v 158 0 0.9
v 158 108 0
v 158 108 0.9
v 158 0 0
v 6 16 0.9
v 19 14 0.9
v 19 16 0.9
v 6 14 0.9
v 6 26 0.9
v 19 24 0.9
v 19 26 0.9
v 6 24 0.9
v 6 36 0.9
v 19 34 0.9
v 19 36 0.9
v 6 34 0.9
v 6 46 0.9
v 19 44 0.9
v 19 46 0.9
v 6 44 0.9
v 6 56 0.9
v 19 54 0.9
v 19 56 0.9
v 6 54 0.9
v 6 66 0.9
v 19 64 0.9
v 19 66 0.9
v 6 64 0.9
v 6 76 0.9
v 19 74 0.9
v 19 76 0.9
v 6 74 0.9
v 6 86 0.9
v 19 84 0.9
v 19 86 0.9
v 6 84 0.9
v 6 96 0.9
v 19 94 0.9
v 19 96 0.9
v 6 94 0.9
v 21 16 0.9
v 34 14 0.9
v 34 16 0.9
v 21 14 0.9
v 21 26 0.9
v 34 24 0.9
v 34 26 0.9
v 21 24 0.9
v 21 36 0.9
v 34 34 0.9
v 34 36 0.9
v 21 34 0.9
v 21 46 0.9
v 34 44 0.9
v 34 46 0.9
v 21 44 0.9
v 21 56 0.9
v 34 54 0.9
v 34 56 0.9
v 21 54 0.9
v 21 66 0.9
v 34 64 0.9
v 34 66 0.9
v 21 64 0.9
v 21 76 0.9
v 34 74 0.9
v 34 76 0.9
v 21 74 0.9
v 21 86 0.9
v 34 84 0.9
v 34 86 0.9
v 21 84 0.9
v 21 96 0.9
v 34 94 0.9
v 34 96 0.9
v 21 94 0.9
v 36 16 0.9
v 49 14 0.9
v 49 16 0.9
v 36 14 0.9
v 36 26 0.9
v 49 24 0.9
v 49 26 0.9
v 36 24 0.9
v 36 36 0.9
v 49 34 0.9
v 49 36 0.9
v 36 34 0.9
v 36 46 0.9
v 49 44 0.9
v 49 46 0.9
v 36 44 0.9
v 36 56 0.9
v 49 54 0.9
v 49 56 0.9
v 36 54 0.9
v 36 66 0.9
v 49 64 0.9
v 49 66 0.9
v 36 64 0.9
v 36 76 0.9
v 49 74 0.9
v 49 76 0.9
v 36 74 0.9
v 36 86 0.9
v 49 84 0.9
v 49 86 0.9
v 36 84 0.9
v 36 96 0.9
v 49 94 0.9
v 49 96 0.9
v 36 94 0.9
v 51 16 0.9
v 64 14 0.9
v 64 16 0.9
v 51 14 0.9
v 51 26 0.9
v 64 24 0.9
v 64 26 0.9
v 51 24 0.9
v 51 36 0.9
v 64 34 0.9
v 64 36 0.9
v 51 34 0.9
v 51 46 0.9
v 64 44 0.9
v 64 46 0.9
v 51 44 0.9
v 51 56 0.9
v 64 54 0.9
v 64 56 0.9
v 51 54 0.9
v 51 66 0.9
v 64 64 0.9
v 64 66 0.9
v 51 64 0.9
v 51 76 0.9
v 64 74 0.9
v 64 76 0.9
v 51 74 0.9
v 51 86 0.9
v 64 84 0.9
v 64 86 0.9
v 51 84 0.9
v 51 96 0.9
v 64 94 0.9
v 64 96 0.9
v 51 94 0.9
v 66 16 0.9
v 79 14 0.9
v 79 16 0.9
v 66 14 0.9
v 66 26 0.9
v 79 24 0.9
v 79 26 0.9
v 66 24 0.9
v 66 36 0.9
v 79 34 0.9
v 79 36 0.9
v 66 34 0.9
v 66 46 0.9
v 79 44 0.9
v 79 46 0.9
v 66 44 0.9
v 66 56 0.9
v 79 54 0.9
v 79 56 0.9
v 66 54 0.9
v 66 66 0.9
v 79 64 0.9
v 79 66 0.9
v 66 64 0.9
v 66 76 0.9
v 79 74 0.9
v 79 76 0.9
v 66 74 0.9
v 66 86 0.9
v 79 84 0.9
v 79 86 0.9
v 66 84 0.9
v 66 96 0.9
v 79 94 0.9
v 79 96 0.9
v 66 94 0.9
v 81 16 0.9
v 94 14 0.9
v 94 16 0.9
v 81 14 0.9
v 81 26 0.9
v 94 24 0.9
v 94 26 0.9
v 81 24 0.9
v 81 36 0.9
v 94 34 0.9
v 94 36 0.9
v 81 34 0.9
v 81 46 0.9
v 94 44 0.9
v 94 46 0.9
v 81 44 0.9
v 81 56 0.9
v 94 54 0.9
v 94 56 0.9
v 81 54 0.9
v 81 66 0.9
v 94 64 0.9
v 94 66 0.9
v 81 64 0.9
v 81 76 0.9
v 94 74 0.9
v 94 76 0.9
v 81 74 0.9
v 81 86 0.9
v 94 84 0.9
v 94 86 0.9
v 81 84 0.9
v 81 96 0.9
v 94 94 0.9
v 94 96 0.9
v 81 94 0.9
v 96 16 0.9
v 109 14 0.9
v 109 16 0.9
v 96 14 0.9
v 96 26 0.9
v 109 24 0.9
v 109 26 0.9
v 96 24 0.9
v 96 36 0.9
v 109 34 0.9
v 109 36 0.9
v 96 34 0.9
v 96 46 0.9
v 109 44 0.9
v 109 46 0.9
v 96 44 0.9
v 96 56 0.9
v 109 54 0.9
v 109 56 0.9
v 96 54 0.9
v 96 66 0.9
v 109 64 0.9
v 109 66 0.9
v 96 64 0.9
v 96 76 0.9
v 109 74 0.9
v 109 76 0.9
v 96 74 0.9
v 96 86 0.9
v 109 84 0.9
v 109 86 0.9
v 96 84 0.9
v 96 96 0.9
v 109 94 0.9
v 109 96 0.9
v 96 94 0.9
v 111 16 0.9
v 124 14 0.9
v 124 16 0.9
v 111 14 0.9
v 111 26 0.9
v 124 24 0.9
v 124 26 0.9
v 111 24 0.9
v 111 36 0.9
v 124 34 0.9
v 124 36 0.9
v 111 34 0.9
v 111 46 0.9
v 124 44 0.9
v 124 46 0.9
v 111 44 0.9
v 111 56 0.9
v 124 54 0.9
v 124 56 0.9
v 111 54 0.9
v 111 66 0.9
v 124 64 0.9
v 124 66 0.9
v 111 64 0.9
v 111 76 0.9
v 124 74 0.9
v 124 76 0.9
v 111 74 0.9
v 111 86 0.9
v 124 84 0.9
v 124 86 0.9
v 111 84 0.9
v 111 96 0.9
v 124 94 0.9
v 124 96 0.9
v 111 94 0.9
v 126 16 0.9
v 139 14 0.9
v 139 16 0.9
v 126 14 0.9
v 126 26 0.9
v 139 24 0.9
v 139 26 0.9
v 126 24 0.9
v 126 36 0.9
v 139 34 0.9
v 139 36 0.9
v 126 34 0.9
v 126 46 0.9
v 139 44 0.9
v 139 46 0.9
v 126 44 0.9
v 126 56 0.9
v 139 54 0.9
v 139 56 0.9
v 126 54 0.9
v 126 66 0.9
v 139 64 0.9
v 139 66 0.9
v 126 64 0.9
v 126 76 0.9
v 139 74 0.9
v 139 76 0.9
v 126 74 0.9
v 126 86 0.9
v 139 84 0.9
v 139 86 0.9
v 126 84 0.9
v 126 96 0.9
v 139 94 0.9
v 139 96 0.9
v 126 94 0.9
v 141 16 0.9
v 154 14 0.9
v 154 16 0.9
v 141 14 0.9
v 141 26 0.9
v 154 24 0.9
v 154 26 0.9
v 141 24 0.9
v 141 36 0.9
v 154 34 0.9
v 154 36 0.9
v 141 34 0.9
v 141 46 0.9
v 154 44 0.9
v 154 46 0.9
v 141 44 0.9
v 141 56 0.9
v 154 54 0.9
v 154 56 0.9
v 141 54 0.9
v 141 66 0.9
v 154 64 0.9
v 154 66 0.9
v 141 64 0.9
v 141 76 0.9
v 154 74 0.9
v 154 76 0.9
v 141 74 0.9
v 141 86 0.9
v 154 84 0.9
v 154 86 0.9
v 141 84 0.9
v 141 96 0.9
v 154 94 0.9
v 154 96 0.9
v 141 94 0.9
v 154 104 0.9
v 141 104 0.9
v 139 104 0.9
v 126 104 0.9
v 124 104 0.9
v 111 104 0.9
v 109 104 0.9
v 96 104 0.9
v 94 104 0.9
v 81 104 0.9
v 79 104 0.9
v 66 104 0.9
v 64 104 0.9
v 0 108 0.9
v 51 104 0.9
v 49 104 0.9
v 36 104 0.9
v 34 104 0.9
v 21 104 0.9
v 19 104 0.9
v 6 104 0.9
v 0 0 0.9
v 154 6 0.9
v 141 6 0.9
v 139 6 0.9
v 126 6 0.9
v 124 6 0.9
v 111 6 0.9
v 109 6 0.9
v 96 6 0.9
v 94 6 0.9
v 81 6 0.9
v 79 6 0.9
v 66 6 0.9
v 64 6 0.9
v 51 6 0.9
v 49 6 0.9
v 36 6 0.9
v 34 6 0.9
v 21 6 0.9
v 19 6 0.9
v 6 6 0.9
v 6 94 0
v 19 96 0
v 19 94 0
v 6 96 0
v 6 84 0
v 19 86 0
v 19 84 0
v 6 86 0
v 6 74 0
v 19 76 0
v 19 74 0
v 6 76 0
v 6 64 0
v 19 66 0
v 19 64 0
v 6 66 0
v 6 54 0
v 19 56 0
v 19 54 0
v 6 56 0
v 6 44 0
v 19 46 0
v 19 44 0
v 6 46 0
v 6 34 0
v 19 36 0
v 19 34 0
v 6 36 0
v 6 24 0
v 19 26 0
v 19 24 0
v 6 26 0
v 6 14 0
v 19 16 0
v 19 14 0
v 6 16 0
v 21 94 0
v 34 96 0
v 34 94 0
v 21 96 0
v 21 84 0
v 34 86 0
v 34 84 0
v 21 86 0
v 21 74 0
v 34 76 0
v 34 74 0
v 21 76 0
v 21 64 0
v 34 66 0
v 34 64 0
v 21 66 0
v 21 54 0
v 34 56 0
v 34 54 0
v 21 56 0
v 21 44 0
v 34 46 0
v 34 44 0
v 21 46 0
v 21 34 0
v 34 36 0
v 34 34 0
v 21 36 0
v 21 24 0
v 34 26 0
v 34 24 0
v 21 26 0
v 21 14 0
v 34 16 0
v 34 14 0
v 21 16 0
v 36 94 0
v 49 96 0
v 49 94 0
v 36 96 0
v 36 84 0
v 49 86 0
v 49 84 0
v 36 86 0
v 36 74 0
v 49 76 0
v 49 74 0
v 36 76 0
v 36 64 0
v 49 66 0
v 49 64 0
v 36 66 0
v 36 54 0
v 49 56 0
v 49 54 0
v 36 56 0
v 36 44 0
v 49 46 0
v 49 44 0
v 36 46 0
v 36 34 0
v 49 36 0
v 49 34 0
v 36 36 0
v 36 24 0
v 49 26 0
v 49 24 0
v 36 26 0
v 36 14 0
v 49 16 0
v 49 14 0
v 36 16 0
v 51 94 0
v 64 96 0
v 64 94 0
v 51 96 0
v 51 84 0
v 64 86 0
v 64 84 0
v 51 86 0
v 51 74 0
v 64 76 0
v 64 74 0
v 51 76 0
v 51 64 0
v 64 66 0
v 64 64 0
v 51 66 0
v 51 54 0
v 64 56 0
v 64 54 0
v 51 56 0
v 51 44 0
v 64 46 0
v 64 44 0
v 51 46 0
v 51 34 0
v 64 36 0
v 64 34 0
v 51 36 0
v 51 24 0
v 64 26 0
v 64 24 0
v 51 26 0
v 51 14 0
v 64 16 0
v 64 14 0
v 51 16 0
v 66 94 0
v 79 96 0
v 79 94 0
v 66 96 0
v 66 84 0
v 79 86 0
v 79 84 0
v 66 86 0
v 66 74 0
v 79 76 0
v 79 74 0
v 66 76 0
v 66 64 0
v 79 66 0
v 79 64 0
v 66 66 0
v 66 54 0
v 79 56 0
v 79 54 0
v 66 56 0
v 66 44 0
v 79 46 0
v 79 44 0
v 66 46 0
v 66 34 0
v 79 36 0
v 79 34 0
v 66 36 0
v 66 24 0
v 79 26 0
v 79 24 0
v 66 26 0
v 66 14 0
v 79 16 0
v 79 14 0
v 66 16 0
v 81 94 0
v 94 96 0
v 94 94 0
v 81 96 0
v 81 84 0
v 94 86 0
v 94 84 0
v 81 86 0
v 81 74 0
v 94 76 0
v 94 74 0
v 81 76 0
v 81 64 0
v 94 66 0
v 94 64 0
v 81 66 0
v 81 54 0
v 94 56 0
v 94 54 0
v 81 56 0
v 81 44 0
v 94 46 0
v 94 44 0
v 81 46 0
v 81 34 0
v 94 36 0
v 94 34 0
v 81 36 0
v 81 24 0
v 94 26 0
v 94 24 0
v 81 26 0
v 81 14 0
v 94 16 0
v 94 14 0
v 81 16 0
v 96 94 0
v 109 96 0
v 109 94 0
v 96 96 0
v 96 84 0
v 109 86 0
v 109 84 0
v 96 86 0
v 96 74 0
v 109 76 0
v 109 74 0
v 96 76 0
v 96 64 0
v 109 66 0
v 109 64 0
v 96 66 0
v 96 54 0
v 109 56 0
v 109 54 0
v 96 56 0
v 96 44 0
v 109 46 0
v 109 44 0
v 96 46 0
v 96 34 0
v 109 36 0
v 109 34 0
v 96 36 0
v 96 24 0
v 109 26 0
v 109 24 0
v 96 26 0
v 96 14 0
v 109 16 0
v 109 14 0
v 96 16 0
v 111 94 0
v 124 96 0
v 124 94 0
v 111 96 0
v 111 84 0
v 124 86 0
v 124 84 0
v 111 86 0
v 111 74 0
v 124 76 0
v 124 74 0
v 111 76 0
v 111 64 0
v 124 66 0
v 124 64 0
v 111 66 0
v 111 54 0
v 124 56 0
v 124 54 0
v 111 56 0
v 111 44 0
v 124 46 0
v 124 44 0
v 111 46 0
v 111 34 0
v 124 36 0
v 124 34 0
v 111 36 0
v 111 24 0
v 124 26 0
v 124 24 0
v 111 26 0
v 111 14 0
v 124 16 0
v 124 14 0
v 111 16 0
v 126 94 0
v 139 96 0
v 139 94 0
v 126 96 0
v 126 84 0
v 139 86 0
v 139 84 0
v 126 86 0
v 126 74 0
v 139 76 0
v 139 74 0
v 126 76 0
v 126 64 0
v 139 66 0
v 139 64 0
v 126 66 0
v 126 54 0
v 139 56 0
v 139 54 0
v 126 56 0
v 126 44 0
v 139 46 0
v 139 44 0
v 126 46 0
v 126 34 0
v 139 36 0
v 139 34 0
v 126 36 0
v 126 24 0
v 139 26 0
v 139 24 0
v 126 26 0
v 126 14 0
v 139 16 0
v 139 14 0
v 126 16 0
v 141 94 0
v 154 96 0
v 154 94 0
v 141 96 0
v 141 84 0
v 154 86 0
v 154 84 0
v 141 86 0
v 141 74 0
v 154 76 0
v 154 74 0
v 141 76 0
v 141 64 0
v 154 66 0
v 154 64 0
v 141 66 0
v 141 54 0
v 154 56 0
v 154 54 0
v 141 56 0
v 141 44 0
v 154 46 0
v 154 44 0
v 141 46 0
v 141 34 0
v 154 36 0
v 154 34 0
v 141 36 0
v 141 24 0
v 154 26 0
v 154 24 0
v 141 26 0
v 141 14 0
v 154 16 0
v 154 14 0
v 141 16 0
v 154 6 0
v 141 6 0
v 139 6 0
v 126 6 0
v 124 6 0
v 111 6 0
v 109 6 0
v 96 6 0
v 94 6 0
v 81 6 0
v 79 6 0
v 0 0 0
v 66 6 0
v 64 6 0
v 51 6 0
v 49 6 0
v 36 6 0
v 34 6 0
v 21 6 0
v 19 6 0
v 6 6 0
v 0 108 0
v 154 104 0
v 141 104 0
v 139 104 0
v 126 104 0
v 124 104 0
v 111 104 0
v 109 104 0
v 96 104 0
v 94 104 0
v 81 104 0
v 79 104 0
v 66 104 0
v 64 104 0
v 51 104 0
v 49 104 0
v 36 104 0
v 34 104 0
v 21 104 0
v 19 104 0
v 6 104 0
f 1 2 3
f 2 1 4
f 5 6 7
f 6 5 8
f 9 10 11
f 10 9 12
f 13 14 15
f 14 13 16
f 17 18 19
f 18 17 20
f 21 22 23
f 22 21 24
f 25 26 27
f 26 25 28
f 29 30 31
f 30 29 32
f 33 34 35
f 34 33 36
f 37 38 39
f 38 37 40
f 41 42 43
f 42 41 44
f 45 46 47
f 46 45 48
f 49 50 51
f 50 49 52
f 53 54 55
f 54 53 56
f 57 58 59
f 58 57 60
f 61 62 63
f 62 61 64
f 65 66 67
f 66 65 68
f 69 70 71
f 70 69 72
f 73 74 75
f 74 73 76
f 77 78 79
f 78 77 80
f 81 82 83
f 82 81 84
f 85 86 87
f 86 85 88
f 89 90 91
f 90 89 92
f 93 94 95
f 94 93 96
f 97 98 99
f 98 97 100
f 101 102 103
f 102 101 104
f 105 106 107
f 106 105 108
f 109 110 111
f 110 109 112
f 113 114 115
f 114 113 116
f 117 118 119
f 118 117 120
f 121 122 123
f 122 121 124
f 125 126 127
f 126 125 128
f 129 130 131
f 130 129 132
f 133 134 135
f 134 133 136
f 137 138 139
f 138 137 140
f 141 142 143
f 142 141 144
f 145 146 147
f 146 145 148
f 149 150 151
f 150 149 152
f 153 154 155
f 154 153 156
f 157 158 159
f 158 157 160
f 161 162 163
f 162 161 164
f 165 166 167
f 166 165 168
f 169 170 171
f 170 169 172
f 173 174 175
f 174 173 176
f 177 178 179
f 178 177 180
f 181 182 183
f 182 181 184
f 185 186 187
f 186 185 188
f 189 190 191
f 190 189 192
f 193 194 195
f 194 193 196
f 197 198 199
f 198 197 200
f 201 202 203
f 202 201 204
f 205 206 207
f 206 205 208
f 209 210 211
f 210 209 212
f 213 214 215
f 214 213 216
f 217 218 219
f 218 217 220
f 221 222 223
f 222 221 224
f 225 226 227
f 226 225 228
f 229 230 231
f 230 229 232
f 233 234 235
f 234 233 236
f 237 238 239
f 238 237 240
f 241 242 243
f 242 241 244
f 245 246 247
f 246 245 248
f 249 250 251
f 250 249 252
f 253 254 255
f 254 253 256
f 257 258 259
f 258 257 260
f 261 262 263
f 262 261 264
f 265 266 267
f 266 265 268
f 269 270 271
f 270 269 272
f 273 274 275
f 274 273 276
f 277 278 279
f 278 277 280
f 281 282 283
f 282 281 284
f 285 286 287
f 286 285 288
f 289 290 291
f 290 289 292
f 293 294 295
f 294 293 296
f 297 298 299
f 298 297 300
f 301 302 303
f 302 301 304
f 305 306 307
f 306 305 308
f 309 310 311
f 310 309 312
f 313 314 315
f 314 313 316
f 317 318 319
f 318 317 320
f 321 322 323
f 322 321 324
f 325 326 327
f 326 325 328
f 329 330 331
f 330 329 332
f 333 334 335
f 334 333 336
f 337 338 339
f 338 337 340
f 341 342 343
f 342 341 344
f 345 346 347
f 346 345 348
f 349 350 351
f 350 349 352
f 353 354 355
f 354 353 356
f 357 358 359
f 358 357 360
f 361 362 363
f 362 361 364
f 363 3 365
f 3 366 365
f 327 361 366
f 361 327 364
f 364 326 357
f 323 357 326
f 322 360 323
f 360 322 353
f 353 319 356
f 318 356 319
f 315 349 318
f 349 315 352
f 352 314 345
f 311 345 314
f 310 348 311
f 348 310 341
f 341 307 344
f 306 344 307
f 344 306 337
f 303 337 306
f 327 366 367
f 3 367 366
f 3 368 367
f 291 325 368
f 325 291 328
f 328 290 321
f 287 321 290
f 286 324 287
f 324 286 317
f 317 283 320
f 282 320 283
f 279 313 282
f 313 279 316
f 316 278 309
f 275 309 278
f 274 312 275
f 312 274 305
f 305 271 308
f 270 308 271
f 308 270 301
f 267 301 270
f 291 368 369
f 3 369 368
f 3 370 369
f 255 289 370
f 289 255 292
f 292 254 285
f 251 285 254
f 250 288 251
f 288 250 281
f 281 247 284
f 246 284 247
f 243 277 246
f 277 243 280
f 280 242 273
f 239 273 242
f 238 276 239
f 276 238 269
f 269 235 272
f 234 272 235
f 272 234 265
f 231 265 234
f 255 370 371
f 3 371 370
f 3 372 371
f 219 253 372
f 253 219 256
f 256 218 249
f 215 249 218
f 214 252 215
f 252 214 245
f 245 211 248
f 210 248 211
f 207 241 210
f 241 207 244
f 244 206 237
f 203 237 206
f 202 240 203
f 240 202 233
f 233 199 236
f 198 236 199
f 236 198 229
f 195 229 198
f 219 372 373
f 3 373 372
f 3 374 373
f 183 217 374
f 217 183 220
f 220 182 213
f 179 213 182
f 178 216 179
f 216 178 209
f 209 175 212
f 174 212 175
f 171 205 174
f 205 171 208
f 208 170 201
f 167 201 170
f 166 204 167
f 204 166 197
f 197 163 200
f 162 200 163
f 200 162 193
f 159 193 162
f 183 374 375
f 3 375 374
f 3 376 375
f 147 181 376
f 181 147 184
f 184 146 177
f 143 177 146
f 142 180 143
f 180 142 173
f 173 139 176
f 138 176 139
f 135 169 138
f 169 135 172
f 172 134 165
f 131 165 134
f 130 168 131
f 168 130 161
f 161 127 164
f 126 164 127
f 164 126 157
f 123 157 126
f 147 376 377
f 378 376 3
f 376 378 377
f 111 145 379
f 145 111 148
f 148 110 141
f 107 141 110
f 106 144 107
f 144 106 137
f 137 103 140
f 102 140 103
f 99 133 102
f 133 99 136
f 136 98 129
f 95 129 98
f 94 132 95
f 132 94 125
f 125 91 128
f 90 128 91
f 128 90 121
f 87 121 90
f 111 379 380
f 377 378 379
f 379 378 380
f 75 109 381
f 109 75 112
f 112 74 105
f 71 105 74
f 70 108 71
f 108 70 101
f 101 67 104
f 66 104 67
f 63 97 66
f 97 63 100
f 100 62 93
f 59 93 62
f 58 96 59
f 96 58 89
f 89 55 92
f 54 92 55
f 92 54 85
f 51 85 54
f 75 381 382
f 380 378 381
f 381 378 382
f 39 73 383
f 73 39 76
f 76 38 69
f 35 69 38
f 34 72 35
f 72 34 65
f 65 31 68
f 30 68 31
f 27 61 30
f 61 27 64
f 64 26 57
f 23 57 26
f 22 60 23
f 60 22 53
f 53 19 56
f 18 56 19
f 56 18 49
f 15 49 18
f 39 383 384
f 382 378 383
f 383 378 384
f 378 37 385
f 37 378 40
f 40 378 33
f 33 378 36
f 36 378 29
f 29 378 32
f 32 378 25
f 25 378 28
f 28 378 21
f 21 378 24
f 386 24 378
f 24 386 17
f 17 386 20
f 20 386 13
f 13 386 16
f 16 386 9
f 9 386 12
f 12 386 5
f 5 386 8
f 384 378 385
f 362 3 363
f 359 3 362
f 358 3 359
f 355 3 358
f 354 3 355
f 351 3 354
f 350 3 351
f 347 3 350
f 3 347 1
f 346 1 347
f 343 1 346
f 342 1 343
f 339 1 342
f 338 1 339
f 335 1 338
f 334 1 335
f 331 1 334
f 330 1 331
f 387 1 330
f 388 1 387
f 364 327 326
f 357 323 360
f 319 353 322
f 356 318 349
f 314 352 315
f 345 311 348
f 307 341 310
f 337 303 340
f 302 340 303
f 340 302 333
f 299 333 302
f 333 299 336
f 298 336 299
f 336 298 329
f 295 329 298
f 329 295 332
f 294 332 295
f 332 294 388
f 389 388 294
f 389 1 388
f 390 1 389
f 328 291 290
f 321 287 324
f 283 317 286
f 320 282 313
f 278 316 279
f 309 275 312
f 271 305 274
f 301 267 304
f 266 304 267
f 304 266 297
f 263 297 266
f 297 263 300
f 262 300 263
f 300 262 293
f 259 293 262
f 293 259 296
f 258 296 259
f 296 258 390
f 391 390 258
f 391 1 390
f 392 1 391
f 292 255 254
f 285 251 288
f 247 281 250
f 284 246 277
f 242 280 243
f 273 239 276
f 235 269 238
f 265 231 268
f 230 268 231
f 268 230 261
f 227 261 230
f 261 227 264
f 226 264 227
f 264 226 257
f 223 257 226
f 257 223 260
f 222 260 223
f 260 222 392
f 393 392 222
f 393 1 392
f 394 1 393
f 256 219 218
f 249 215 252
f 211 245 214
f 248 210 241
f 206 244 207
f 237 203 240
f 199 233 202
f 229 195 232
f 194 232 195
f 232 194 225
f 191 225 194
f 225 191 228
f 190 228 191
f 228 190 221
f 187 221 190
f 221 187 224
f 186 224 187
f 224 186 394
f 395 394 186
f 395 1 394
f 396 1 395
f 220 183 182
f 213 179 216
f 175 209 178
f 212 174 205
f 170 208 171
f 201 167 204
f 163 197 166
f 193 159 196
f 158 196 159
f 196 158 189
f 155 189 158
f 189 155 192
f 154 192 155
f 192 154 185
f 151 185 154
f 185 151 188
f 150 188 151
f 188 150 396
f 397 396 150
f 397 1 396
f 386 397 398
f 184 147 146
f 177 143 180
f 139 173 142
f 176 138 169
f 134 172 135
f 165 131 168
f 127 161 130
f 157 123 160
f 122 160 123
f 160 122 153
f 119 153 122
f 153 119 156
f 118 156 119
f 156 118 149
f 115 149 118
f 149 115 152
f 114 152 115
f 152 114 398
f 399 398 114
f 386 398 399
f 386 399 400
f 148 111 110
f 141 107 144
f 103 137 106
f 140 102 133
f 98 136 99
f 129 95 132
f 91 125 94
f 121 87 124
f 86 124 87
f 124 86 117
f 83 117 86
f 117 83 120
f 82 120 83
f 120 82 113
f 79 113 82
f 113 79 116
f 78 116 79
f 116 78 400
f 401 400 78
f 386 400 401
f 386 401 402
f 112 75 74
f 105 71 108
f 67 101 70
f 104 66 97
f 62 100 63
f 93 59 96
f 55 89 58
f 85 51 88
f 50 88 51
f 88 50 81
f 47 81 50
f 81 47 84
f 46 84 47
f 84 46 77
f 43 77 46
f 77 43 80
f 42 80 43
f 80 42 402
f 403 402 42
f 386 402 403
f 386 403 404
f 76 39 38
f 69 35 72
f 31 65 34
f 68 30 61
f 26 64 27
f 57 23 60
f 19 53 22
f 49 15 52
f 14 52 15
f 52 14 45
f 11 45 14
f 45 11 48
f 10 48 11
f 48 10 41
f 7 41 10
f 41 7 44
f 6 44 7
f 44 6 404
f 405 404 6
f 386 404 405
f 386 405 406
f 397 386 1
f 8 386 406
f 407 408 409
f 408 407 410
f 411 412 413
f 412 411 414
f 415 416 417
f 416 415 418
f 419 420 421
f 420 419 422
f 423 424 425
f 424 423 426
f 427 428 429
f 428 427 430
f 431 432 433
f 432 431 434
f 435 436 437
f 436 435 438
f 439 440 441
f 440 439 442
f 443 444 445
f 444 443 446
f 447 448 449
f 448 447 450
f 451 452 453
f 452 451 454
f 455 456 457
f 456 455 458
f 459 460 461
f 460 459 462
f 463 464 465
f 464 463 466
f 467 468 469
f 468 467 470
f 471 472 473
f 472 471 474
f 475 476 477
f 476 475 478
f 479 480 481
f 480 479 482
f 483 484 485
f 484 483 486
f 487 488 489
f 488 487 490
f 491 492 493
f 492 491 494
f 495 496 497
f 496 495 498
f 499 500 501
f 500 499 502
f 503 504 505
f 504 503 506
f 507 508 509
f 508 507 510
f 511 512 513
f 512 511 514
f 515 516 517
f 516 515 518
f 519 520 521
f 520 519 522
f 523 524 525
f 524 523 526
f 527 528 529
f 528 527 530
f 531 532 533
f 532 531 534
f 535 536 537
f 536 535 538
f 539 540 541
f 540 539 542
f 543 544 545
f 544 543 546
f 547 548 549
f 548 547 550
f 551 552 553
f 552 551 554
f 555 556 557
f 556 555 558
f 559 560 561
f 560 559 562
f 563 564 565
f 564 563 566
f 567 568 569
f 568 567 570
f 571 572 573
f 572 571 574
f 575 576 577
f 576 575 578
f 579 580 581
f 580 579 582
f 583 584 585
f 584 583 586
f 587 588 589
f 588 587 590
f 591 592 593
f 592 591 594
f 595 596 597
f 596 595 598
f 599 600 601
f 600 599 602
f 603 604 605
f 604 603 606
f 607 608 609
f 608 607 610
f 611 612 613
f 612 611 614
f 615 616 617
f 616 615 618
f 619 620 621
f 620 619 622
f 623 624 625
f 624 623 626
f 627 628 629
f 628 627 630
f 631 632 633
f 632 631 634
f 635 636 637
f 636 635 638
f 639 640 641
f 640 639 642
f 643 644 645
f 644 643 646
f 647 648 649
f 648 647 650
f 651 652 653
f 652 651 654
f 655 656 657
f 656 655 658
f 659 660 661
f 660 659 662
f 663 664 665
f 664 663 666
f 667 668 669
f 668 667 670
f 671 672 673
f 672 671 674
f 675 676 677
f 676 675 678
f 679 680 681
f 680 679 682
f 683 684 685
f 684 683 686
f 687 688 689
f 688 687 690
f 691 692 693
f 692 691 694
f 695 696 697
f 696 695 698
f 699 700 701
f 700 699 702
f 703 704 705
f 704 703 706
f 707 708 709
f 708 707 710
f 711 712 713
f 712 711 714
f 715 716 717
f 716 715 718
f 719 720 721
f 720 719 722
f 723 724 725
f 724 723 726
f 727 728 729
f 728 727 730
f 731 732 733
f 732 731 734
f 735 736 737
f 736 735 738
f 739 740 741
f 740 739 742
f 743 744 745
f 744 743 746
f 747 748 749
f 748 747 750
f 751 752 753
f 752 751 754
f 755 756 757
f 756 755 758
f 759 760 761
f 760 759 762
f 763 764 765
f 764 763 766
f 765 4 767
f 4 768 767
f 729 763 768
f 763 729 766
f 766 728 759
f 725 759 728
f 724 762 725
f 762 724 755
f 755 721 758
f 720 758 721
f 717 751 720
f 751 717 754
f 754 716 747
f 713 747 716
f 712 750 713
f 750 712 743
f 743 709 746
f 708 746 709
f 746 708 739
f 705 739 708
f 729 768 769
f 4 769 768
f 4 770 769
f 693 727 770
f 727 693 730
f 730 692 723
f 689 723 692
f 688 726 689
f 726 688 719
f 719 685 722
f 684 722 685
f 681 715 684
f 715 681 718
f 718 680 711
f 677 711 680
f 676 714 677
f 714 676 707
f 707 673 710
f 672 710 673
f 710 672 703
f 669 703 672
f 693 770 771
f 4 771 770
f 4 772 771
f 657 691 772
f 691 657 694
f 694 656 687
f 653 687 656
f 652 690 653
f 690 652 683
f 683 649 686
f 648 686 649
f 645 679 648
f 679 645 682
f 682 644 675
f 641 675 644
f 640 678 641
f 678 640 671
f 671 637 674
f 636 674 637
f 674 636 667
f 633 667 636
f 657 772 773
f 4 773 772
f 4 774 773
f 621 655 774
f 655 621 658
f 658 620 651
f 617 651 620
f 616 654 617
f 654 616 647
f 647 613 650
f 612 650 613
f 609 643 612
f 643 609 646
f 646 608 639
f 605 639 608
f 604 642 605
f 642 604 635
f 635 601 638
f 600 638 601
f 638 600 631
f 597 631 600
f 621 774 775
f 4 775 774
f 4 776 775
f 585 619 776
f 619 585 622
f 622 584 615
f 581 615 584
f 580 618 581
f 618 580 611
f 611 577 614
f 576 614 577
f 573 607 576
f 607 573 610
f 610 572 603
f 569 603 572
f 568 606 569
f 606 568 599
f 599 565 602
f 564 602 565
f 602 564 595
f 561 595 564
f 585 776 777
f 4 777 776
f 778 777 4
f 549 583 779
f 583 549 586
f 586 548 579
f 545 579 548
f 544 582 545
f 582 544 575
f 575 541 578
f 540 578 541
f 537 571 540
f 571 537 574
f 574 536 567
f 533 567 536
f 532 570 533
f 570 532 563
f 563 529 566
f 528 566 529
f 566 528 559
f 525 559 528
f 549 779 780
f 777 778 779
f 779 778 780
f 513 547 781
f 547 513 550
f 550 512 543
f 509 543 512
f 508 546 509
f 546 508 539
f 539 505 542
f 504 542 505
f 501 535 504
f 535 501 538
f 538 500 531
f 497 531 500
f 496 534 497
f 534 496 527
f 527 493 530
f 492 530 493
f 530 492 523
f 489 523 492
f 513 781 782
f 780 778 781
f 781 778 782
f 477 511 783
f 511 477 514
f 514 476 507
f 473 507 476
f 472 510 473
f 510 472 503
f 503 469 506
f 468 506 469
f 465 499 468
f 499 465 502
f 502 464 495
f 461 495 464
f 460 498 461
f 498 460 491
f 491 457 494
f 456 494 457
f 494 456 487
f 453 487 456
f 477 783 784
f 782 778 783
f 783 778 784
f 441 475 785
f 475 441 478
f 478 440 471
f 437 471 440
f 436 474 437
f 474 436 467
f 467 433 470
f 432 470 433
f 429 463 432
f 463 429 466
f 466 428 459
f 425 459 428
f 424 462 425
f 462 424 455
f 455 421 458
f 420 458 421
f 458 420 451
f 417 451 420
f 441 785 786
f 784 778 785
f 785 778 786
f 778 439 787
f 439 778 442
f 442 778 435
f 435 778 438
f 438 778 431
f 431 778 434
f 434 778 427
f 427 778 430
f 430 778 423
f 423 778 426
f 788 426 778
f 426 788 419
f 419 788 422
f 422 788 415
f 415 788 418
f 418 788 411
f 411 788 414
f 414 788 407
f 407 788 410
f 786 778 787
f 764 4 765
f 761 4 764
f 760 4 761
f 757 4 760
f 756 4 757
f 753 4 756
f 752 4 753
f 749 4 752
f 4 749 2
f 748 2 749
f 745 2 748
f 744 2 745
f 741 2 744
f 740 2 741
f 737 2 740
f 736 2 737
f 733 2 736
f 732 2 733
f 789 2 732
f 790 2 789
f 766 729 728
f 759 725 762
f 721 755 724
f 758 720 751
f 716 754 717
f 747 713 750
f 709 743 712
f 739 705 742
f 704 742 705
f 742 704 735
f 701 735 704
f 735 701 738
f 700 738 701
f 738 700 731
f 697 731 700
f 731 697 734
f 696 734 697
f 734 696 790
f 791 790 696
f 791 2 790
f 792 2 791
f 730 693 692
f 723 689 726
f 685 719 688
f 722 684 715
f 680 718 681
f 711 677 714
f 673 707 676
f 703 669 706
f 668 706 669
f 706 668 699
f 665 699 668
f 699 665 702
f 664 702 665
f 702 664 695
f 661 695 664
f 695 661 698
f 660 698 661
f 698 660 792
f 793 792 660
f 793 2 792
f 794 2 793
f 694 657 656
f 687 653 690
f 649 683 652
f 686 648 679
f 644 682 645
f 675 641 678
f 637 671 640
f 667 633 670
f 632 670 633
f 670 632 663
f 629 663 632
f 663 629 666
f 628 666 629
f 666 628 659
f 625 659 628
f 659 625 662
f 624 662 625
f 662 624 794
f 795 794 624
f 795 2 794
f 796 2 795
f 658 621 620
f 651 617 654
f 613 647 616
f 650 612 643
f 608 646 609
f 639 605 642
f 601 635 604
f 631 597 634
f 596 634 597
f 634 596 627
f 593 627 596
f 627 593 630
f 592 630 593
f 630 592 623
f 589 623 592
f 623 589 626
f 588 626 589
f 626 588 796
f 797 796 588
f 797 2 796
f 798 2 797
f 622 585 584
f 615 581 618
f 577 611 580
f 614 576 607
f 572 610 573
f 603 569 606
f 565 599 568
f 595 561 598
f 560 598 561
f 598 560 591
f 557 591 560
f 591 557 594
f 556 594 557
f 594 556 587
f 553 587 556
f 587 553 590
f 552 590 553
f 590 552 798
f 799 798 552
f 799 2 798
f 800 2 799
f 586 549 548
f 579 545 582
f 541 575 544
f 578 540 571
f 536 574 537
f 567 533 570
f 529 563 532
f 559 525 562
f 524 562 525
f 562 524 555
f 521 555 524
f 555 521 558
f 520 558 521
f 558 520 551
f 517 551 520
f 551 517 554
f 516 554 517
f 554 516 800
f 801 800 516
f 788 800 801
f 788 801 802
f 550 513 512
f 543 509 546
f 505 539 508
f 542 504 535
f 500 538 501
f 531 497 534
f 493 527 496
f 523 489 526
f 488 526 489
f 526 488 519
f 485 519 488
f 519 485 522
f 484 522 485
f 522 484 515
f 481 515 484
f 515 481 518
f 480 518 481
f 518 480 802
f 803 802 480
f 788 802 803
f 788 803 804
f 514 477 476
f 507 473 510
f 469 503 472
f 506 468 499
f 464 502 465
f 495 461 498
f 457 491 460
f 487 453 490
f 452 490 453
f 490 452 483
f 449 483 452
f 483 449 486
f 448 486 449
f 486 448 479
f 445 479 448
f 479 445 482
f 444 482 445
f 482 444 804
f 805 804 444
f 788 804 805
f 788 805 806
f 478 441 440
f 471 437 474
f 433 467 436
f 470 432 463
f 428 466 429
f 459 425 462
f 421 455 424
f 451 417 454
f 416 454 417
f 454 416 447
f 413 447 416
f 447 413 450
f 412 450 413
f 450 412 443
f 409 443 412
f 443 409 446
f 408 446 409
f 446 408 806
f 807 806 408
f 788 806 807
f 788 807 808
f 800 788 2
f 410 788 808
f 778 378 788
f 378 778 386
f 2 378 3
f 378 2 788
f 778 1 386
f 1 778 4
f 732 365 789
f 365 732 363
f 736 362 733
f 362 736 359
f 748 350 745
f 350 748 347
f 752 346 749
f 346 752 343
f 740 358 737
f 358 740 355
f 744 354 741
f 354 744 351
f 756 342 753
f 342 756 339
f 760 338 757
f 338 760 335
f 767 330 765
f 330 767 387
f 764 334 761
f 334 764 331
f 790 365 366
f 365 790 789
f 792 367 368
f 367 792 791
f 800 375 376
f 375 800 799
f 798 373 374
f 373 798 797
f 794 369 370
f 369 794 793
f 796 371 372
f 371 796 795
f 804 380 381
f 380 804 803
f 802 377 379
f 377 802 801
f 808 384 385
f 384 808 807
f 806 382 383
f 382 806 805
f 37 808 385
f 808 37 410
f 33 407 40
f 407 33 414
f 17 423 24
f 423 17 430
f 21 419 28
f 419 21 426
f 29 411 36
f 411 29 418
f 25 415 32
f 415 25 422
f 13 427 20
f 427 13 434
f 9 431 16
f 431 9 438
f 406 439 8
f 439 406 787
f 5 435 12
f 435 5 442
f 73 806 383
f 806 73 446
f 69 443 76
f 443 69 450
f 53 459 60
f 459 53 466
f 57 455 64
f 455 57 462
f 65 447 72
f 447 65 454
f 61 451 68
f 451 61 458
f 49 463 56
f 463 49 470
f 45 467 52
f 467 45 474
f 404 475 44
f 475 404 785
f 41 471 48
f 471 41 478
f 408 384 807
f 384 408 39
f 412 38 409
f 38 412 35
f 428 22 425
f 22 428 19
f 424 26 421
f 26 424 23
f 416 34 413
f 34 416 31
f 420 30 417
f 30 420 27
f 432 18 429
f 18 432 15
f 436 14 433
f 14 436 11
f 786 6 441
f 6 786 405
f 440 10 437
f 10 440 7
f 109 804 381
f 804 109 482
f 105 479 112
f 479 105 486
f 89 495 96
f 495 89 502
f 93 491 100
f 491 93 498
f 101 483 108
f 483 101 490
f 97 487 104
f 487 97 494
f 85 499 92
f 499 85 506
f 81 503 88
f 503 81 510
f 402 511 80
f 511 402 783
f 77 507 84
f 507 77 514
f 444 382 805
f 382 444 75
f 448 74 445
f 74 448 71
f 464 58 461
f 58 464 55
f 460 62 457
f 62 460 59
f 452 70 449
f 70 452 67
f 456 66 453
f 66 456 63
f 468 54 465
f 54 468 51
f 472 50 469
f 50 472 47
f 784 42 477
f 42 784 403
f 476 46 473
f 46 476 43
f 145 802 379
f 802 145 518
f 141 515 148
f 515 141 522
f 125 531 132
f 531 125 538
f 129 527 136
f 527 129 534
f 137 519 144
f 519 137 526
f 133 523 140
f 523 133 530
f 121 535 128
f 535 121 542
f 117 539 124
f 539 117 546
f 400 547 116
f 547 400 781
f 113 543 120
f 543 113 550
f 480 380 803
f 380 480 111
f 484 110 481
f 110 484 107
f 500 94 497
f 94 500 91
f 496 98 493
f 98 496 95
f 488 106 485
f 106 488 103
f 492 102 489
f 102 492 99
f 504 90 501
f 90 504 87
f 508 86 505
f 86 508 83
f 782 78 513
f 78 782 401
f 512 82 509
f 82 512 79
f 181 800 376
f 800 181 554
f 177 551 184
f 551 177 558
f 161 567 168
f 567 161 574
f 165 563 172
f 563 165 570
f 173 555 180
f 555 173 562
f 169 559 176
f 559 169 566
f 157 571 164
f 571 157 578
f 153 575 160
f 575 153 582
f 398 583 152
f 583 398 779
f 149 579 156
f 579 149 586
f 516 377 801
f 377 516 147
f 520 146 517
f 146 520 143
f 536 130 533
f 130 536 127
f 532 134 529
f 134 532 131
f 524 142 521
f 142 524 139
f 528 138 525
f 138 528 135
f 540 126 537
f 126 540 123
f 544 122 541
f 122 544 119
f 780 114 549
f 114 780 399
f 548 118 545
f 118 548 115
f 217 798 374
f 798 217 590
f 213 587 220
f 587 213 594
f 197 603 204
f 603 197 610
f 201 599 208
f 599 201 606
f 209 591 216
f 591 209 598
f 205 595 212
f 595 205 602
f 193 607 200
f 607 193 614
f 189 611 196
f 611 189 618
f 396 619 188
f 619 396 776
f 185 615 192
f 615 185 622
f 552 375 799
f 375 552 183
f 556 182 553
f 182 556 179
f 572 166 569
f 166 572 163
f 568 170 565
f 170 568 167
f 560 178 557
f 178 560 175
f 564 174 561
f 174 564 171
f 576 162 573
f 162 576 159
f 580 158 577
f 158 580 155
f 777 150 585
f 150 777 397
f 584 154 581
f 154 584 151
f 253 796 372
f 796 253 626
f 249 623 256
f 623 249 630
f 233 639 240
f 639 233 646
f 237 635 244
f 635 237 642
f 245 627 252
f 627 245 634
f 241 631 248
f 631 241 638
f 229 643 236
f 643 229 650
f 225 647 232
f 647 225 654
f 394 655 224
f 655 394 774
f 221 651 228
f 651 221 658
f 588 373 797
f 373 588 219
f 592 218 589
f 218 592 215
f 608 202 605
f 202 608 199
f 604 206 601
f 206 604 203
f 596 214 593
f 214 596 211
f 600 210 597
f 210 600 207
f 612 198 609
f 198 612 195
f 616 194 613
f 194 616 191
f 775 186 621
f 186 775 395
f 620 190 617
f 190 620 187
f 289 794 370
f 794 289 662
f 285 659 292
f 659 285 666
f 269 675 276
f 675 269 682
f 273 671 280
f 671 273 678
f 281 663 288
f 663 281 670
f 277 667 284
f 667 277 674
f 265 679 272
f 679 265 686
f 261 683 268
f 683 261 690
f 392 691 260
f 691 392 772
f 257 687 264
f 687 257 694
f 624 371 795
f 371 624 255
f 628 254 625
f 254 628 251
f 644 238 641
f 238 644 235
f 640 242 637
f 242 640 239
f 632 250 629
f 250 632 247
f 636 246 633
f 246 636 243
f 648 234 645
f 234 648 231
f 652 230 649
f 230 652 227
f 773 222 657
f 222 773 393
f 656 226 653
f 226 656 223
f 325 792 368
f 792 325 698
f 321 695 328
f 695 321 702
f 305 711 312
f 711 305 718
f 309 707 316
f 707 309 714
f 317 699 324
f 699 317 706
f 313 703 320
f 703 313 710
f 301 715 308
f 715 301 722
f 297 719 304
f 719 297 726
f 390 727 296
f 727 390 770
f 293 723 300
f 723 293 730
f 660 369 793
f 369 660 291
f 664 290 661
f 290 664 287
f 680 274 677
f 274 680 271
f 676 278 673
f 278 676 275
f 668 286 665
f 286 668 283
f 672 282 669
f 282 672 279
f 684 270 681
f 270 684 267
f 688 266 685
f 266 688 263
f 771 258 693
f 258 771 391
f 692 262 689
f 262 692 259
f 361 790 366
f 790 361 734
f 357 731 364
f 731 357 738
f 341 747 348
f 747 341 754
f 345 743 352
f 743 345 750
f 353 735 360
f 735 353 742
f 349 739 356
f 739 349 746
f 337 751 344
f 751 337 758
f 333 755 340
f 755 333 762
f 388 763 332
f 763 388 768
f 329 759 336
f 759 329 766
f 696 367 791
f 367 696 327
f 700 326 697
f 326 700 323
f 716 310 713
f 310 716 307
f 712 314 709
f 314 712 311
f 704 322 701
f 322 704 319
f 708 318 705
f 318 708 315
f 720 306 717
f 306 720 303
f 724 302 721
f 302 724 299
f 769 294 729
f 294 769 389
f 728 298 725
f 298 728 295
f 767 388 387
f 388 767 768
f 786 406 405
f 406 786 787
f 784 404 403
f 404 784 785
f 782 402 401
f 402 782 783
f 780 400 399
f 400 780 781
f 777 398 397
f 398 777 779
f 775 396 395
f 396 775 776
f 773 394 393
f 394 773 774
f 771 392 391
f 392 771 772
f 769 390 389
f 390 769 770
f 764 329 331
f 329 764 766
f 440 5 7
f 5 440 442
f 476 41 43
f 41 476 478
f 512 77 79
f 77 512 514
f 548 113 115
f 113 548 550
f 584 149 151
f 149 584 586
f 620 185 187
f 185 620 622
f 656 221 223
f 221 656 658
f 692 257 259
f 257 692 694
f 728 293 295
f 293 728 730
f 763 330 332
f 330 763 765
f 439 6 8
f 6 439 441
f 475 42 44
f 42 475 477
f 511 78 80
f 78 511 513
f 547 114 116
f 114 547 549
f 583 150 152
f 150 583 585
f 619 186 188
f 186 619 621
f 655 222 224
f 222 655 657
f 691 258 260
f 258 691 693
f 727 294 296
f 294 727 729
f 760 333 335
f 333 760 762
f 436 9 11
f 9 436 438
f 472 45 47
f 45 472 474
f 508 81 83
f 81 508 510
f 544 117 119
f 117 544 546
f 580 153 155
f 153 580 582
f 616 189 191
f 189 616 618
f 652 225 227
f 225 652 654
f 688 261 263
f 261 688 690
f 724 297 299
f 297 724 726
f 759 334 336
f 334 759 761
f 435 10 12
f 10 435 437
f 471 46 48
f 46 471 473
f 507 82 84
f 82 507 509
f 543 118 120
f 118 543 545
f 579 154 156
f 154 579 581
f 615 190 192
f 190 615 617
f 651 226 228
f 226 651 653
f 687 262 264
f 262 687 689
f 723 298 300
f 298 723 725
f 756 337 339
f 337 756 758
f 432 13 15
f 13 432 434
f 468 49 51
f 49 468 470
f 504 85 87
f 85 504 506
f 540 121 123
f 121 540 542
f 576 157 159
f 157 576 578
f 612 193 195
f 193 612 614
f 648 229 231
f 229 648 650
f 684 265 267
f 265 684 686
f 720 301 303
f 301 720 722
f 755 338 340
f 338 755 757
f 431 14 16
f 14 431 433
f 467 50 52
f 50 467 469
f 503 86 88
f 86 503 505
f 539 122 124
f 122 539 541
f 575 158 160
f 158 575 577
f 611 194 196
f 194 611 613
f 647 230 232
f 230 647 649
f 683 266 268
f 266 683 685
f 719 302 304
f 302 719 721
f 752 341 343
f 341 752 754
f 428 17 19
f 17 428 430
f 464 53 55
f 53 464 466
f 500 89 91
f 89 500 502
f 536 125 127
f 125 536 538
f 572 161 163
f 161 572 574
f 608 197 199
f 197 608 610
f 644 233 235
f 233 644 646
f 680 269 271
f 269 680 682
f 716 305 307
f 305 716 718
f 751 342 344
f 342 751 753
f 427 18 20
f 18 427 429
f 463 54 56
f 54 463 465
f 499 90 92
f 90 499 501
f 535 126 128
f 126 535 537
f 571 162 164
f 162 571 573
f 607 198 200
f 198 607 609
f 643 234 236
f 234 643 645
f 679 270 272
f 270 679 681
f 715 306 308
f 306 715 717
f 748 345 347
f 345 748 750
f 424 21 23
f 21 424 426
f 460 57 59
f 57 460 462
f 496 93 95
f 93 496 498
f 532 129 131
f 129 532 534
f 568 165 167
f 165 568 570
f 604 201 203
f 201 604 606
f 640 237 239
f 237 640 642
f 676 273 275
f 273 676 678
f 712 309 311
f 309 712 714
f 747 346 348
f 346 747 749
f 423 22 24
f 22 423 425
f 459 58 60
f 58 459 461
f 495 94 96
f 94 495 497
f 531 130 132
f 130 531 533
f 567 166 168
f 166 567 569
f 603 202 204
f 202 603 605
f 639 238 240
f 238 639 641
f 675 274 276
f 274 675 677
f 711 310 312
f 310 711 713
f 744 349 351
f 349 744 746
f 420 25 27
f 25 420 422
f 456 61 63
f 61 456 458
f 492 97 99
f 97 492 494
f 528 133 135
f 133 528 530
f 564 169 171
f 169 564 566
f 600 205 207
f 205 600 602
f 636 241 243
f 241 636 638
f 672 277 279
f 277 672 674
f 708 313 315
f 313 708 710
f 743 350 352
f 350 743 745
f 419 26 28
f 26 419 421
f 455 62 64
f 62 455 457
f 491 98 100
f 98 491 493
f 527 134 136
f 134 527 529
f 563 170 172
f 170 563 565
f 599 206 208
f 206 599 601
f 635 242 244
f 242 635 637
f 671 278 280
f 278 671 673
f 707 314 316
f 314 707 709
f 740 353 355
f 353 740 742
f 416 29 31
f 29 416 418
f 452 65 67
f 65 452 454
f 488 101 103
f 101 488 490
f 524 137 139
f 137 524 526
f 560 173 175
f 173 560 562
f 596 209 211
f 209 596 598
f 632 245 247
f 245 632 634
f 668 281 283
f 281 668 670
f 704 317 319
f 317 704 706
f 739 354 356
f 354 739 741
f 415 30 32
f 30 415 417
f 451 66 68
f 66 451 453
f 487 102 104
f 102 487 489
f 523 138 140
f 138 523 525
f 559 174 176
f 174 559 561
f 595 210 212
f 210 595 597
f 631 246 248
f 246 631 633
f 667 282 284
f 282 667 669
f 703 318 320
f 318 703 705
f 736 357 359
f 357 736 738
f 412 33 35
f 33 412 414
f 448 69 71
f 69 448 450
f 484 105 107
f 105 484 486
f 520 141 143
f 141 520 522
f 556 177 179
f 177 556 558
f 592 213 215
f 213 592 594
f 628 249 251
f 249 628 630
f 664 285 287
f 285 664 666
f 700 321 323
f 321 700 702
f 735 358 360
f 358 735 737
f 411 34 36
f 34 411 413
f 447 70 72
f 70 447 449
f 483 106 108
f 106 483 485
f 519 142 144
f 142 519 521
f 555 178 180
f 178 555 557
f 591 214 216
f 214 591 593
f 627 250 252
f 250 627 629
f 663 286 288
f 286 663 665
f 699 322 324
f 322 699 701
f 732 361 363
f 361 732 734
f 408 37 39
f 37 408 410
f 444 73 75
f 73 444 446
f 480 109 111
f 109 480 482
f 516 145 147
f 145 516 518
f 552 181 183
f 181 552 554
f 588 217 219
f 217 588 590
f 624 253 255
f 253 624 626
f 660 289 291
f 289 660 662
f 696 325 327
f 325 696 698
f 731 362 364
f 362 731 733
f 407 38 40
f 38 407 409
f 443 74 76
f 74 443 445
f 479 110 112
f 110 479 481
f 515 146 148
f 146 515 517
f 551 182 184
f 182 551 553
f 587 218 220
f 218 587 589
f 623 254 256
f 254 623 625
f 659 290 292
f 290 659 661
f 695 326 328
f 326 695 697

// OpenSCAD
w = 150;
h = 100;
th = 0.9;
pad = 4;
step_x = w/10;
step_y = h/10;
bar_w = 2;

difference() {
  cube([w+pad*2, h+pad*2, th]);
  translate([pad, pad, 0]) {
    cube([w, h, th]);
  }
}
for(x=[0:step_x:w]) {
//  echo("X=", x, w, step);
  translate([pad+x, pad, 0]) {
    cube([bar_w, h, th]);
  }
}
for(y=[0:step_y:h]) {
//  echo("Y=", y, h, step);
  translate([pad, pad+y, 0]) {
    cube([w, bar_w, th]);
  }
}
